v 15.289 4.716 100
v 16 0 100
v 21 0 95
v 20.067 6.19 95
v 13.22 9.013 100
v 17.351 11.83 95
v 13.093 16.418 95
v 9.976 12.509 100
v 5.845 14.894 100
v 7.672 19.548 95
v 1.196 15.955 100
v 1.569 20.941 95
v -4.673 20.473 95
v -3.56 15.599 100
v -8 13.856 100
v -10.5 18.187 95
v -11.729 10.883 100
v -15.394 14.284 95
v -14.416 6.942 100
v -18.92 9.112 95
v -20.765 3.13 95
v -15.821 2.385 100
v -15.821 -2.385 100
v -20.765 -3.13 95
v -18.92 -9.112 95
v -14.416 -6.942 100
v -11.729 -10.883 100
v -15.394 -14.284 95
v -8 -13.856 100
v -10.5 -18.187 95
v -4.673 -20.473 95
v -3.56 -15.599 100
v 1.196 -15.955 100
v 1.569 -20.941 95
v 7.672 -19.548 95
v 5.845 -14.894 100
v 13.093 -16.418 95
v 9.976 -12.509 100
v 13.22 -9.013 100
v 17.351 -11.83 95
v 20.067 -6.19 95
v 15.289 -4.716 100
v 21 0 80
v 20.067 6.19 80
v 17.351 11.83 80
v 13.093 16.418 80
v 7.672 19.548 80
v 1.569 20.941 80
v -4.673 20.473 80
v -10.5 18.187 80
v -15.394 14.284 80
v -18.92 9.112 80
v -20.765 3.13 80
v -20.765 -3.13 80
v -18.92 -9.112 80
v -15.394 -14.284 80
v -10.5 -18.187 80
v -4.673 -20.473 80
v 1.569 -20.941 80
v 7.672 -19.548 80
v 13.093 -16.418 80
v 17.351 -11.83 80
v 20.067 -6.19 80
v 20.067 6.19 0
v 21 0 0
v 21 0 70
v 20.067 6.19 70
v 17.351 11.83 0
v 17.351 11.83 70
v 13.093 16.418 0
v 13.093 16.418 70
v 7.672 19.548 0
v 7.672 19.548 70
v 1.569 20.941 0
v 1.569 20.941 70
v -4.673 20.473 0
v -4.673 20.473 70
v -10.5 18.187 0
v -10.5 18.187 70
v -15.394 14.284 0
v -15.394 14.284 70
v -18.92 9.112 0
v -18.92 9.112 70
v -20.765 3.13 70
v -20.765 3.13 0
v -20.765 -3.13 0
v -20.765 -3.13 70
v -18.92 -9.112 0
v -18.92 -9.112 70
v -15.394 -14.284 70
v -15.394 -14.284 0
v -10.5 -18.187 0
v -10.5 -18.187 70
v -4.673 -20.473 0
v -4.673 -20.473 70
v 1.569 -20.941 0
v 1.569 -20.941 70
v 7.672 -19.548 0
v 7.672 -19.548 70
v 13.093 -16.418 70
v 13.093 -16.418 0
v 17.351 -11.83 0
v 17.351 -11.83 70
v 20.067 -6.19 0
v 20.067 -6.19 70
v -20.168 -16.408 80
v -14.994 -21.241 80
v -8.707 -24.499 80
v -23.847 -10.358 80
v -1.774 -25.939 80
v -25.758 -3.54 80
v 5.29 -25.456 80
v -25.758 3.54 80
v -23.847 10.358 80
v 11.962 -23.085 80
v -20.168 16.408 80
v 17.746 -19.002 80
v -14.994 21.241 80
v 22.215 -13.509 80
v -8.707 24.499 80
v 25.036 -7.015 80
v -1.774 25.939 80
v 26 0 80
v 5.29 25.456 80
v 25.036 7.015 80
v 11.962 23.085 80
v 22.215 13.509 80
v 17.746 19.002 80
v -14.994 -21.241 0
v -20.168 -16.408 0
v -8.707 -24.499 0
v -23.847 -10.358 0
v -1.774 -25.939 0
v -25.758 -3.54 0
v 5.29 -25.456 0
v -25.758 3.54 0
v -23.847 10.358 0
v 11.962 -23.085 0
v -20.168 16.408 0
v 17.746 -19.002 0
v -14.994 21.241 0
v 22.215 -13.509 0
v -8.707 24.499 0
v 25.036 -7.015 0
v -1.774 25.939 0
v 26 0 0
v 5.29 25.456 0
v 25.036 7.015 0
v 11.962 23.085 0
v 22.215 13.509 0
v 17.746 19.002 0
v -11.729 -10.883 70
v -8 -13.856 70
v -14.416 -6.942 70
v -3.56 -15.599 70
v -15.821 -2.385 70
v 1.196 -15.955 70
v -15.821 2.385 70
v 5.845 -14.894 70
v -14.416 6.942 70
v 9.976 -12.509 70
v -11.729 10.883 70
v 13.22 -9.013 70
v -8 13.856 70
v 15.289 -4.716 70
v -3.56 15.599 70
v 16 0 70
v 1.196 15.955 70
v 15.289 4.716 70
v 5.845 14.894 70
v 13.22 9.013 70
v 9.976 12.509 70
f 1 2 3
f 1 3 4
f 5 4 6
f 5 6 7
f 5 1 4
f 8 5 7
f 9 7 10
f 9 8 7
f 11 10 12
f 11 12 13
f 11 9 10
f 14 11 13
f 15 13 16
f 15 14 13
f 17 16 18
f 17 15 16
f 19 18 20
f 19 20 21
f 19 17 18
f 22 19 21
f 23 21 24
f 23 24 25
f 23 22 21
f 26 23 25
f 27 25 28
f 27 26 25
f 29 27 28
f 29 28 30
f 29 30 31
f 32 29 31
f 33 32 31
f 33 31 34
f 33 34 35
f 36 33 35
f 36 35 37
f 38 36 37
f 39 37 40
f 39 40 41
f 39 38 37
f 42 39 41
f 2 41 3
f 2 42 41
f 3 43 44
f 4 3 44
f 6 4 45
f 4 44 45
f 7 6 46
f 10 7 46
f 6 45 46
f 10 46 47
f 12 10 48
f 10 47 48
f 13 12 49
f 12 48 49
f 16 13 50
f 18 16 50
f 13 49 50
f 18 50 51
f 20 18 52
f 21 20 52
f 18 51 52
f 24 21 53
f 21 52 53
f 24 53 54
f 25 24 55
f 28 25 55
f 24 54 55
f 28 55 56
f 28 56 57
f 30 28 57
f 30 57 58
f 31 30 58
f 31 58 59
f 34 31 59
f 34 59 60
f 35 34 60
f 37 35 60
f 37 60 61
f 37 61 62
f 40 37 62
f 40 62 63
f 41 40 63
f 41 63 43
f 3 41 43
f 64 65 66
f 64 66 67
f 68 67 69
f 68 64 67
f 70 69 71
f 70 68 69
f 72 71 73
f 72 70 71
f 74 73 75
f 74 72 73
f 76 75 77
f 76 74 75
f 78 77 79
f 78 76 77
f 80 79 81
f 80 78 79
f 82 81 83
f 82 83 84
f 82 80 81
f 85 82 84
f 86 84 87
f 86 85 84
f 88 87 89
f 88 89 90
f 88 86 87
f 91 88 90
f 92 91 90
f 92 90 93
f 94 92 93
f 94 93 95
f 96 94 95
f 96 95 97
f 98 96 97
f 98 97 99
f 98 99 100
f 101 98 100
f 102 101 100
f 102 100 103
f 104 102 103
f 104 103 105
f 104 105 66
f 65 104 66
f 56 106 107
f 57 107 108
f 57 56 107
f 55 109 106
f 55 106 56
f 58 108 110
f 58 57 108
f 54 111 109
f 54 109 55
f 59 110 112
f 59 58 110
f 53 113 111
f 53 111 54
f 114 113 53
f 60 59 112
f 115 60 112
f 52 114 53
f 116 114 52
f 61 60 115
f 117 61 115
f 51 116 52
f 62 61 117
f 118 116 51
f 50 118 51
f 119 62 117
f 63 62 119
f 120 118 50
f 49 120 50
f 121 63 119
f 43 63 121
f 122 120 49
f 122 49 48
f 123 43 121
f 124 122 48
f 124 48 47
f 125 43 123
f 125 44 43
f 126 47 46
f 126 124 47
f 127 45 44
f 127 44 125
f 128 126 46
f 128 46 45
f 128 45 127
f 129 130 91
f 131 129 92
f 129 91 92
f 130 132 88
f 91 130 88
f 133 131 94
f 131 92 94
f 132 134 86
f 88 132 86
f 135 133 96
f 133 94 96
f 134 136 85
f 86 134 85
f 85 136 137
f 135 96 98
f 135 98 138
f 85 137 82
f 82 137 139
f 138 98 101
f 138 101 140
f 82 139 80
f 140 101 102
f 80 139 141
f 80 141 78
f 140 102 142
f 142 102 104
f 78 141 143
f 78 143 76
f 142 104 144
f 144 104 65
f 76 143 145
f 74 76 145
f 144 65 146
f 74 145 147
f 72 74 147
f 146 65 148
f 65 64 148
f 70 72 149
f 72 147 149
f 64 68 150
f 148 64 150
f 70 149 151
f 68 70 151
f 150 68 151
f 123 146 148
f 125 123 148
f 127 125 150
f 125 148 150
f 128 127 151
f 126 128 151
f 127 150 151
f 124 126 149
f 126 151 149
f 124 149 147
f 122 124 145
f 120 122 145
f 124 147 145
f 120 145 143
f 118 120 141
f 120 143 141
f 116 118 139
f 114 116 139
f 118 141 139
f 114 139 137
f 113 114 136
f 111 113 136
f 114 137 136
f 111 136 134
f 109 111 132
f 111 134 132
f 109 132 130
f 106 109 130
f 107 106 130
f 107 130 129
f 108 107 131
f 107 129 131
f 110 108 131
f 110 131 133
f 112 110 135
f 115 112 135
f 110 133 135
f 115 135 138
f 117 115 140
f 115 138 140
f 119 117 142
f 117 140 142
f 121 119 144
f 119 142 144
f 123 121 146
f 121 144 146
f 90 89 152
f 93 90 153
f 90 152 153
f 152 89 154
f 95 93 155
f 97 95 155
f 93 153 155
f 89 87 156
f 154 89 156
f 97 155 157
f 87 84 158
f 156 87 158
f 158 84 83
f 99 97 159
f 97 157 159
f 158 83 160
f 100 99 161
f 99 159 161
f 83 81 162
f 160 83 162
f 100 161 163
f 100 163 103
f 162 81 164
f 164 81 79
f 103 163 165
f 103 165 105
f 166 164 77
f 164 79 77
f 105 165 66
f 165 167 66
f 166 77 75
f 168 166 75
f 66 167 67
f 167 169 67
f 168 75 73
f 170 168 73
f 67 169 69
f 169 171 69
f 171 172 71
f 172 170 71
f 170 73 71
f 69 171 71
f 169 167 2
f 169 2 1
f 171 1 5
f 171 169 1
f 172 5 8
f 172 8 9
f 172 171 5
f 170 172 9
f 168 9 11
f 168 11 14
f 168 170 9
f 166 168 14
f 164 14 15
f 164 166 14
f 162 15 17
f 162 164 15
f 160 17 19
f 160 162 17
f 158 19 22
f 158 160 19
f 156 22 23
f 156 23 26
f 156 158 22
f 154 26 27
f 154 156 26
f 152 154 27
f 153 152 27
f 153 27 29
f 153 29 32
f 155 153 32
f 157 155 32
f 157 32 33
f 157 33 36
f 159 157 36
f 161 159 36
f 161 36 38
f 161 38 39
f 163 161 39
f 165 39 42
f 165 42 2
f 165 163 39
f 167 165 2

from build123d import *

# Parameters (mm, degrees)
SKETCH15_R          = 26
SKETCH15_R_2        = 21
BOSS_EXTRUDE2_DEPTH = 80
BOSS_EXTRUDE5_START = -10
SKETCH18_R          = 21
SKETCH18_R_2        = 16
BOSS_EXTRUDE5_DEPTH = 30
CHAMFER1_SIZE       = 5


with BuildPart() as part:
    # Sketch15 → Boss-Extrude2 (new body)
    with BuildSketch(Plane.XY):
        Circle(SKETCH15_R)
        Circle(SKETCH15_R_2, mode=Mode.SUBTRACT)
    extrude(amount=BOSS_EXTRUDE2_DEPTH)

    # Sketch18 → Boss-Extrude5 (add)
    with BuildSketch(Plane.XY.offset(80).offset(BOSS_EXTRUDE5_START)):
        Circle(SKETCH18_R)
        Circle(SKETCH18_R_2, mode=Mode.SUBTRACT)
    extrude(amount=BOSS_EXTRUDE5_DEPTH)

    # Chamfer1
    chamfer1_edges = [part.edges().sort_by_distance(p)[0] for p in [
        (-21, 0, 100),
    ]]
    chamfer(chamfer1_edges, length=CHAMFER1_SIZE - 0.0001)  # a hair under: the kernel refuses the full size


solid = part.part
